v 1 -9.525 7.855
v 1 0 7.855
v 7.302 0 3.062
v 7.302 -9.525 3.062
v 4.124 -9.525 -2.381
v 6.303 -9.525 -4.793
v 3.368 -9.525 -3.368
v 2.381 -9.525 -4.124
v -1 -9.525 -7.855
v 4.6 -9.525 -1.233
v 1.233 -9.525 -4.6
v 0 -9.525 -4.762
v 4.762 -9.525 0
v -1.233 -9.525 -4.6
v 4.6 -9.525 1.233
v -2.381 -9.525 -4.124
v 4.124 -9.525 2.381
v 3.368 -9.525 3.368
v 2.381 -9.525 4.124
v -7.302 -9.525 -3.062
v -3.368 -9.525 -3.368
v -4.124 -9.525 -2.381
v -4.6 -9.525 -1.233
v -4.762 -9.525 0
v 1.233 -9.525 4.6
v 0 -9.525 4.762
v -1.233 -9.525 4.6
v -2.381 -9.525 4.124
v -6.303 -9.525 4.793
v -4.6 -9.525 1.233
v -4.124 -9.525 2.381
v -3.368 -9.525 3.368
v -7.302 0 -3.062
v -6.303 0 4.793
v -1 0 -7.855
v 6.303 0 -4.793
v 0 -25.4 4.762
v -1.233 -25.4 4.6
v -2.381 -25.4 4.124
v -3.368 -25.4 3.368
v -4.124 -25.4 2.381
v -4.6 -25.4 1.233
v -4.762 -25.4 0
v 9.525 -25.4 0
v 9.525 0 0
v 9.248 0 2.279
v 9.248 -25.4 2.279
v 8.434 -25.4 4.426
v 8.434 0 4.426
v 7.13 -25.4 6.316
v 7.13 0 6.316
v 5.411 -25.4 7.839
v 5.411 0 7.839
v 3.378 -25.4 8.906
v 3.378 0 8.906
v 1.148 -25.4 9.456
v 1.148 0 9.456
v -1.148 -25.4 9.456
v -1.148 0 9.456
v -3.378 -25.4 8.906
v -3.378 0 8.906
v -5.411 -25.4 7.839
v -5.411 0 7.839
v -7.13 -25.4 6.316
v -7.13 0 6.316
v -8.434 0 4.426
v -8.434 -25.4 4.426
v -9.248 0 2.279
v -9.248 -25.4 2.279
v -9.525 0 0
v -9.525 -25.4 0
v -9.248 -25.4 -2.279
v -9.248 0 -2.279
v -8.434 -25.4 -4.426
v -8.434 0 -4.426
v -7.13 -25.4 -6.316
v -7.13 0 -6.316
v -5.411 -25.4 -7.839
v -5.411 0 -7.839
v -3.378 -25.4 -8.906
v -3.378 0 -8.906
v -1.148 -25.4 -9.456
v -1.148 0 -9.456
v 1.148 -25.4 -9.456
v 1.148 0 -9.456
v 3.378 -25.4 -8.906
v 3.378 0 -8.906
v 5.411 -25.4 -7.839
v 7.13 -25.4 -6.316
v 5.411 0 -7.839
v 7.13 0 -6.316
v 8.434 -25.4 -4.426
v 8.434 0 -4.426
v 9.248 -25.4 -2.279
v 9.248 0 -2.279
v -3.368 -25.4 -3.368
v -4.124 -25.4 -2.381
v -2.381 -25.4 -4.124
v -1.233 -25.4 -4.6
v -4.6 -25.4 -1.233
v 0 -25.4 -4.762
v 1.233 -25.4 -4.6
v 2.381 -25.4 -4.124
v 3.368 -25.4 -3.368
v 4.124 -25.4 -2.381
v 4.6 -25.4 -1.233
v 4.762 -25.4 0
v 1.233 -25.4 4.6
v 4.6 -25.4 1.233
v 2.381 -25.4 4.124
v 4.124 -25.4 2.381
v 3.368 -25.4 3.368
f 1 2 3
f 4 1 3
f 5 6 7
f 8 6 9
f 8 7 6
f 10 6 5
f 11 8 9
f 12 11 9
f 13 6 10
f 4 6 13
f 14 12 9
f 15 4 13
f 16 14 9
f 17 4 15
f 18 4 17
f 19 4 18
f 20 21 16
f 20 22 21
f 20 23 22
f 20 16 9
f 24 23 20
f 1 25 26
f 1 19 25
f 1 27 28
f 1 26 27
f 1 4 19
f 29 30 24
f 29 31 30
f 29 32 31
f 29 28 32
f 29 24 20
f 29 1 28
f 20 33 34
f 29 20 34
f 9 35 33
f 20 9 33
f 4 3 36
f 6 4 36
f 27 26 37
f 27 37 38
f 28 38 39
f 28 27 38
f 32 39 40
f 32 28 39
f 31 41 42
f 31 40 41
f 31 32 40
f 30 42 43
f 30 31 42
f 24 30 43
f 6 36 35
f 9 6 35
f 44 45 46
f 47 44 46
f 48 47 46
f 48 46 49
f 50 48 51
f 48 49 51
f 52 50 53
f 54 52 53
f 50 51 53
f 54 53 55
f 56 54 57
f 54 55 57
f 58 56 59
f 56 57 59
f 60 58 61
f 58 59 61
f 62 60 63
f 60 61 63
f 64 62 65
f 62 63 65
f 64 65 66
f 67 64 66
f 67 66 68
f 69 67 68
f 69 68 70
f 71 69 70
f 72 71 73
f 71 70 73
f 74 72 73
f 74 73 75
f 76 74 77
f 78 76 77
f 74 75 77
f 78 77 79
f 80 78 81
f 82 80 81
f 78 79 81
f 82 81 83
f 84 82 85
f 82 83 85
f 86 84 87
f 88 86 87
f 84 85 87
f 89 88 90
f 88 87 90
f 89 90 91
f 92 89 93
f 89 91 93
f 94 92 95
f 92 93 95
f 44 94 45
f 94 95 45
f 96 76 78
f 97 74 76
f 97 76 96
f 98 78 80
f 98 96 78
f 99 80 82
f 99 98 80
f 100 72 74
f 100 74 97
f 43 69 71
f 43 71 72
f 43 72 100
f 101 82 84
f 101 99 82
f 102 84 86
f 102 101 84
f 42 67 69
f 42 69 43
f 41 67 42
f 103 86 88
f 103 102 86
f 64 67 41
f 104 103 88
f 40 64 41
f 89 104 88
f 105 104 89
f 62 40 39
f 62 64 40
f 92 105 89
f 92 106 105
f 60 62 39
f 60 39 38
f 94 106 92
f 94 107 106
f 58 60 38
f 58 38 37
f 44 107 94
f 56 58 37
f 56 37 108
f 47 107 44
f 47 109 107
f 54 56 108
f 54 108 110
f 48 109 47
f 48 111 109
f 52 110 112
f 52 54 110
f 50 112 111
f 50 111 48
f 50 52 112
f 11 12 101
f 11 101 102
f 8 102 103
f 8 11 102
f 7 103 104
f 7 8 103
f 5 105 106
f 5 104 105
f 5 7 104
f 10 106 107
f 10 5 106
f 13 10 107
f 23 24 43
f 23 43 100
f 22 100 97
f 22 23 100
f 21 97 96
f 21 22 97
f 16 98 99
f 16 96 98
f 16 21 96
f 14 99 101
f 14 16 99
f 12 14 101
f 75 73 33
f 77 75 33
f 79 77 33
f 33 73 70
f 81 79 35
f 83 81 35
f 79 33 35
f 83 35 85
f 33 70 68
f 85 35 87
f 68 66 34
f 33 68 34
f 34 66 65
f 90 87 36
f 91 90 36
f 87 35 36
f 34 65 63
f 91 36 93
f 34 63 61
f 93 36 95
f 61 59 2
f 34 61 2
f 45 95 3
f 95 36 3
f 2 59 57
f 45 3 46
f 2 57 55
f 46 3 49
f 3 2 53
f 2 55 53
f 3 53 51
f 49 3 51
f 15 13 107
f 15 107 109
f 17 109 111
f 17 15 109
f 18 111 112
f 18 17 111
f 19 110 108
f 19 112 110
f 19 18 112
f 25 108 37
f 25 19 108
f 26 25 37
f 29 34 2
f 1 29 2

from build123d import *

# Parameters (mm, degrees)
F0_R     = 9.525
F1_DEPTH = 25.4
F3_DEPTH = 25.401
F4_DEPTH = 11.0998
F6_DEPTH = 9.525


with BuildPart() as f1:
    # F0 (on Front) → F1 (new body)
    with BuildSketch(Plane.XZ):
        Circle(F0_R)
    extrude(amount=F1_DEPTH)

    # F2 (on Front) → F3 (cut, through all)
    with BuildSketch(Plane.XZ):
        with BuildLine():
            ThreePointArc((-4.7625, 0), (-3.367596, -3.367596), (0, -4.7625))
            ThreePointArc((0, -4.7625), (3.367596, -3.367596), (4.7625, 0))
            ThreePointArc((4.7625, 0), (3.367596, 3.367596), (0, 4.7625))
            ThreePointArc((0, 4.7625), (-3.367596, 3.367596), (-4.7625, 0))
        make_face()
    extrude(amount=F3_DEPTH, mode=Mode.SUBTRACT)

    # F2 (on Front) → F4 (cut)
    with BuildSketch(Plane.XZ):
        with BuildLine():
            Line((0, -4.7625), (4.7625, -4.7625))
            Line((4.7625, -4.7625), (4.7625, 0))
            ThreePointArc((4.7625, 0), (3.367596, -3.367596), (0, -4.7625))
        make_face()
        with BuildLine():
            Line((-4.7625, -4.7625), (0, -4.7625))
            ThreePointArc((0, -4.7625), (-3.367596, -3.367596), (-4.7625, 0))
            Line((-4.7625, 0), (-4.7625, -4.7625))
        make_face()
        with BuildLine():
            ThreePointArc((0, 4.7625), (3.367596, 3.367596), (4.7625, 0))
            Line((4.7625, 0), (4.7625, 4.7625))
            Line((4.7625, 4.7625), (0, 4.7625))
        make_face()
        with BuildLine():
            Line((-4.7625, 4.7625), (-4.7625, 0))
            ThreePointArc((-4.7625, 0), (-3.367596, 3.367596), (0, 4.7625))
            Line((0, 4.7625), (-4.7625, 4.7625))
        make_face()
    extrude(amount=-F4_DEPTH, mode=Mode.SUBTRACT)

    # F5 (on face) → F6 (cut)
    with BuildSketch(Plane(origin=(0, 0, 0), x_dir=(-1, 0, 0), z_dir=(0, 1, 0))):
        Polygon((0.99988, -7.854919), (7.3025, -3.061538), (6.30262, 4.793382), (-0.99988, 7.854919), (-7.3025, 3.061538), (-6.30262, -4.793382), align=None)
    extrude(amount=-F6_DEPTH, mode=Mode.SUBTRACT)


solid = f1.part
